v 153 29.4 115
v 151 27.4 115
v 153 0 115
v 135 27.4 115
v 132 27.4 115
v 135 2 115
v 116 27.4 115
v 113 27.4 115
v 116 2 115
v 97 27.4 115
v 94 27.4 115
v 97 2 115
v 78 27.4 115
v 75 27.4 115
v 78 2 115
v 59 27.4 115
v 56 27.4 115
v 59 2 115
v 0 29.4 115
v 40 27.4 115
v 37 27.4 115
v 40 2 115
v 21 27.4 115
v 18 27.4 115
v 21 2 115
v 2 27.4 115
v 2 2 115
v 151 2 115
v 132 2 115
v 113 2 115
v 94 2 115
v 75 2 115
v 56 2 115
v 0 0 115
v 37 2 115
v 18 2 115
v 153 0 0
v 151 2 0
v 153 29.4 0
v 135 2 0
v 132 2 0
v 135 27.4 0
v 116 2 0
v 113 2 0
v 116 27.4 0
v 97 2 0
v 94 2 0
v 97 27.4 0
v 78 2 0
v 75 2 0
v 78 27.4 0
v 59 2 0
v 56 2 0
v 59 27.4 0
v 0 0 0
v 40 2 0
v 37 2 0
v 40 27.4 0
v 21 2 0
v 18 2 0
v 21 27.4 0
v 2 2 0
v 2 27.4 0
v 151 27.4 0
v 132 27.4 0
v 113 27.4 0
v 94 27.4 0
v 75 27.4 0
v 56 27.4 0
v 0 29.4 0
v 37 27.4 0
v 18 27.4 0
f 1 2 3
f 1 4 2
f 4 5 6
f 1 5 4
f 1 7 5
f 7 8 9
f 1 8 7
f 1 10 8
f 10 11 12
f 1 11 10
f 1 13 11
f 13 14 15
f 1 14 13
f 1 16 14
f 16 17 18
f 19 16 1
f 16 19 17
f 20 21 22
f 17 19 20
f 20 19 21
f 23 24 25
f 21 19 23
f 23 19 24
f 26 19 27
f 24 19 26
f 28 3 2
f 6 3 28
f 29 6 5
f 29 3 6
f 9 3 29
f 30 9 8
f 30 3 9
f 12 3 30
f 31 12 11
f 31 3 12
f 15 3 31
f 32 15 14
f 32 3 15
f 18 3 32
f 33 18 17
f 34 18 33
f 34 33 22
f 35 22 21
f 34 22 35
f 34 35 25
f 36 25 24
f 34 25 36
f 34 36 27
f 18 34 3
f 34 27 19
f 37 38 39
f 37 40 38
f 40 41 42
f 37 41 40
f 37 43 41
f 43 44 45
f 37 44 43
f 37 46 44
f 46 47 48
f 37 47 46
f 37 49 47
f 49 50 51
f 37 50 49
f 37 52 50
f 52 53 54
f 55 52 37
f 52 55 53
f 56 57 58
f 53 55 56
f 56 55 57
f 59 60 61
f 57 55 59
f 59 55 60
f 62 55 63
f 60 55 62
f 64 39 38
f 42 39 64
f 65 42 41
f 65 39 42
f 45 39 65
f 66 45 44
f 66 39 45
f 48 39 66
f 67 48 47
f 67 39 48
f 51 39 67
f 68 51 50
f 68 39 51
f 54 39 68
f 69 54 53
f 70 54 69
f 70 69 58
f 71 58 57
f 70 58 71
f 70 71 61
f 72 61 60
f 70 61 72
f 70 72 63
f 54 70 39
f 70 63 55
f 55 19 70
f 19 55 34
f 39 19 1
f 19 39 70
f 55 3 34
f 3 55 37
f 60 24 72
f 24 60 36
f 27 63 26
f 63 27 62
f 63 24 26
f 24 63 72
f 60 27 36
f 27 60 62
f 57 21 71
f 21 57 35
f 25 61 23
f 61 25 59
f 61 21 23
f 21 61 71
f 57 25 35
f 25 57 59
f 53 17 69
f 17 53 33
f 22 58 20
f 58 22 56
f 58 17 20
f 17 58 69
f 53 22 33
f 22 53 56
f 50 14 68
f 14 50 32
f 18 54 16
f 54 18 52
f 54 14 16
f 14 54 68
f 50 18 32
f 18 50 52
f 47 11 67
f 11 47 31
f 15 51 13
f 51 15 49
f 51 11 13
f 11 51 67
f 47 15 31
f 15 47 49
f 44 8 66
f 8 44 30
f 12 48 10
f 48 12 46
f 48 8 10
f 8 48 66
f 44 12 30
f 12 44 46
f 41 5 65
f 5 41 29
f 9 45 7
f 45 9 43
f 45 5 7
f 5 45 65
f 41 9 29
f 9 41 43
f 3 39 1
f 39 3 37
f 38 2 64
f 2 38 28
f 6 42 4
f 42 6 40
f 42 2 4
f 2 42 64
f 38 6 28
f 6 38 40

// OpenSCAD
// file: ../lib/rect_tube_inner_lib.scad
// scad/lib/rect_tube_inner_lib.scad
// ----------------------------------------------------------------------------
// LIBRARY: Rectangular tube defined by INNER opening dimensions
// Units: millimeters (mm)
//
// This file is intended to be reusable across parts/presets.
// - Contains functions + modules only
// - Does not render a final object by itself (unless called by a part/preset)
//
// Definition:
// - "inner"  = clear opening (hollow region) [X_inner, Y_inner, Z_length]
// - "outer"  = inner + 2*wall in X and Y, Z unchanged
//
// Tube is open at both ends along Z.
// ----------------------------------------------------------------------------


// Helper: convert inner opening -> outer size.
// Note: Z is the tube length (unchanged).
function outer_from_inner(inner, wall) = [
    inner[0] + 2*wall,
    inner[1] + 2*wall,
    inner[2]
];


// Module: a single rectangular tube defined by INNER opening dimensions.
// Parameters:
// - inner: [X_inner, Y_inner, Z_length]
// - wall:  wall thickness (applied to X and Y walls)
// - eps:   boolean safety extension for the inner cutout
module rect_tube_inner(inner, wall, eps=0.01) {

    outer = outer_from_inner(inner, wall);

    // -----------------------------
    // Input validation (fail loudly)
    // -----------------------------
    if (inner[0] <= 0 || inner[1] <= 0 || inner[2] <= 0) {
        echo("ERROR: inner dimensions must be positive: ", inner);
    }
    else if (wall <= 0) {
        echo("ERROR: wall must be positive: wall=", wall);
    }
    else {
        // -----------------------------
        // Geometry:
        // - Start with outer solid box
        // - Subtract inner cavity
        //
        // The inner cavity is translated by [wall, wall] in X/Y so wall thickness
        // is preserved on both sides.
        //
        // We extend the cavity by +/-eps in Z to ensure clean open ends after
        // boolean operations (prevents “capped” ends due to coplanar faces).
        // -----------------------------
        difference() {
            // Outer solid
            cube(outer, center=false);

            // Inner cutout (slightly extended in Z)
            translate([wall, wall, -eps])
                cube([inner[0], inner[1], inner[2] + 2*eps], center=false);
        }
    }
}


// Module: array of tubes along +X based on OUTER size with an overlap.
// Parameters:
// - inner:   inner opening of each tube
// - count:   how many tubes
// - wall:    wall thickness
// - overlap: overlap between adjacent tubes (mm)
// - eps:     boolean safety extension
module tube_array_inner(inner, count, wall, overlap=0.01, eps=0.01) {

    outer = outer_from_inner(inner, wall);

    // -----------------------------
    // Array validation / guard rails
    // -----------------------------
    if (count <= 0) {
        echo("ERROR: count must be > 0. count=", count);
    }
    else if (overlap < 0) {
        echo("ERROR: overlap must be >= 0. overlap=", overlap);
    }
    else if (overlap >= outer[0]) {
        echo("ERROR: overlap must be < outer X size. overlap=", overlap, " outer=", outer);
    }
    else {
        // -----------------------------
        // Placement:
        // Step along X by (outer_x - overlap)
        // so each tube slightly intersects the previous tube.
        // -----------------------------
        union() {
            for (i = [0 : count-1]) {
                translate([i * (outer[0] - overlap), 0, 0])
                    rect_tube_inner(inner, wall, eps);
            }
        }
    }
}
// file: ../parts/rect_tube_array_spec_inner.scad
// scad/parts/rect_tube_array_spec_inner.scad
// ----------------------------------------------------------------------------
// PART: Array of identical rectangular tubes along +X
// Spec style: INNER dimensions define the clear opening (hollow region).
//
// Why a "part" wrapper?
// - Presets should call a stable public module (this file)
// - The wrapper delegates to the lower-level library geometry
//
// This file should NOT contain hard-coded preset values.
// ----------------------------------------------------------------------------

use <../lib/rect_tube_inner_lib.scad>;

// Public “part” module: presets call this.
// Parameters:
// - inner_size: [X_inner, Y_inner, Z_length]  (mm)
// - count: number of tubes in the array
// - wall_xy: wall thickness for X and Y sides (mm)
// - overlap: overlap between tubes along X to avoid seam artifacts (mm)
// - eps: tiny extension for boolean cut (mm)
module rect_tube_array_part(inner_size, count, wall_xy, overlap=0.01, eps=0.01) {
    tube_array_inner(
        inner   = inner_size,
        count   = count,
        wall    = wall_xy,
        overlap = overlap,
        eps     = eps
    );
}
// main file
// scad/presets/default.scad
// ----------------------------------------------------------------------------
// Preset: "Pi ↔ Switch cable tunnel" (DEFAULT)
// Units: millimeters (mm)
//
// What this preset does:
// - Defines the INNER (clear opening) dimensions of a rectangular tube
// - Creates an array of identical tubes along +X (a multi-lane tunnel)
//
// Repo convention:
// - presets/* only set parameters + call a part module
// - parts/* provide a clean public module API
// - lib/* contains reusable geometry + helper functions
// ----------------------------------------------------------------------------

use <../parts/rect_tube_array_spec_inner.scad>;

// -----------------------------
// Preset parameters (EDIT THESE)
// -----------------------------

// Inner (clear opening) dimensions of ONE tube:
// [X_inner, Y_inner, Z_length]
inner_size = [16, 25.4, 115];

// How many tubes in the array (placed along +X)
count = 8;

// Overlap between neighboring tubes (mm).
// Why overlap?
// - When booleans/unions happen, tiny overlaps help avoid seam / non-manifold issues.
// If you ever see artifacts, bump overlap slightly (e.g. 0.2 → 0.5 → 1.0).
overlap = 1;

// Wall thickness on the X and Y sides (mm).
// (Z is the tube length; it stays open at both ends.)
wall_xy = 2;

// Tiny epsilon for boolean cuts (mm).
// Used to extend the inner cutout slightly past the ends to keep it “open”.
eps = 0.01;

// -----------------------------
// Render the model for this preset
// -----------------------------
rect_tube_array_part(
    inner_size = inner_size,
    count      = count,
    wall_xy    = wall_xy,
    overlap    = overlap,
    eps        = eps
);
